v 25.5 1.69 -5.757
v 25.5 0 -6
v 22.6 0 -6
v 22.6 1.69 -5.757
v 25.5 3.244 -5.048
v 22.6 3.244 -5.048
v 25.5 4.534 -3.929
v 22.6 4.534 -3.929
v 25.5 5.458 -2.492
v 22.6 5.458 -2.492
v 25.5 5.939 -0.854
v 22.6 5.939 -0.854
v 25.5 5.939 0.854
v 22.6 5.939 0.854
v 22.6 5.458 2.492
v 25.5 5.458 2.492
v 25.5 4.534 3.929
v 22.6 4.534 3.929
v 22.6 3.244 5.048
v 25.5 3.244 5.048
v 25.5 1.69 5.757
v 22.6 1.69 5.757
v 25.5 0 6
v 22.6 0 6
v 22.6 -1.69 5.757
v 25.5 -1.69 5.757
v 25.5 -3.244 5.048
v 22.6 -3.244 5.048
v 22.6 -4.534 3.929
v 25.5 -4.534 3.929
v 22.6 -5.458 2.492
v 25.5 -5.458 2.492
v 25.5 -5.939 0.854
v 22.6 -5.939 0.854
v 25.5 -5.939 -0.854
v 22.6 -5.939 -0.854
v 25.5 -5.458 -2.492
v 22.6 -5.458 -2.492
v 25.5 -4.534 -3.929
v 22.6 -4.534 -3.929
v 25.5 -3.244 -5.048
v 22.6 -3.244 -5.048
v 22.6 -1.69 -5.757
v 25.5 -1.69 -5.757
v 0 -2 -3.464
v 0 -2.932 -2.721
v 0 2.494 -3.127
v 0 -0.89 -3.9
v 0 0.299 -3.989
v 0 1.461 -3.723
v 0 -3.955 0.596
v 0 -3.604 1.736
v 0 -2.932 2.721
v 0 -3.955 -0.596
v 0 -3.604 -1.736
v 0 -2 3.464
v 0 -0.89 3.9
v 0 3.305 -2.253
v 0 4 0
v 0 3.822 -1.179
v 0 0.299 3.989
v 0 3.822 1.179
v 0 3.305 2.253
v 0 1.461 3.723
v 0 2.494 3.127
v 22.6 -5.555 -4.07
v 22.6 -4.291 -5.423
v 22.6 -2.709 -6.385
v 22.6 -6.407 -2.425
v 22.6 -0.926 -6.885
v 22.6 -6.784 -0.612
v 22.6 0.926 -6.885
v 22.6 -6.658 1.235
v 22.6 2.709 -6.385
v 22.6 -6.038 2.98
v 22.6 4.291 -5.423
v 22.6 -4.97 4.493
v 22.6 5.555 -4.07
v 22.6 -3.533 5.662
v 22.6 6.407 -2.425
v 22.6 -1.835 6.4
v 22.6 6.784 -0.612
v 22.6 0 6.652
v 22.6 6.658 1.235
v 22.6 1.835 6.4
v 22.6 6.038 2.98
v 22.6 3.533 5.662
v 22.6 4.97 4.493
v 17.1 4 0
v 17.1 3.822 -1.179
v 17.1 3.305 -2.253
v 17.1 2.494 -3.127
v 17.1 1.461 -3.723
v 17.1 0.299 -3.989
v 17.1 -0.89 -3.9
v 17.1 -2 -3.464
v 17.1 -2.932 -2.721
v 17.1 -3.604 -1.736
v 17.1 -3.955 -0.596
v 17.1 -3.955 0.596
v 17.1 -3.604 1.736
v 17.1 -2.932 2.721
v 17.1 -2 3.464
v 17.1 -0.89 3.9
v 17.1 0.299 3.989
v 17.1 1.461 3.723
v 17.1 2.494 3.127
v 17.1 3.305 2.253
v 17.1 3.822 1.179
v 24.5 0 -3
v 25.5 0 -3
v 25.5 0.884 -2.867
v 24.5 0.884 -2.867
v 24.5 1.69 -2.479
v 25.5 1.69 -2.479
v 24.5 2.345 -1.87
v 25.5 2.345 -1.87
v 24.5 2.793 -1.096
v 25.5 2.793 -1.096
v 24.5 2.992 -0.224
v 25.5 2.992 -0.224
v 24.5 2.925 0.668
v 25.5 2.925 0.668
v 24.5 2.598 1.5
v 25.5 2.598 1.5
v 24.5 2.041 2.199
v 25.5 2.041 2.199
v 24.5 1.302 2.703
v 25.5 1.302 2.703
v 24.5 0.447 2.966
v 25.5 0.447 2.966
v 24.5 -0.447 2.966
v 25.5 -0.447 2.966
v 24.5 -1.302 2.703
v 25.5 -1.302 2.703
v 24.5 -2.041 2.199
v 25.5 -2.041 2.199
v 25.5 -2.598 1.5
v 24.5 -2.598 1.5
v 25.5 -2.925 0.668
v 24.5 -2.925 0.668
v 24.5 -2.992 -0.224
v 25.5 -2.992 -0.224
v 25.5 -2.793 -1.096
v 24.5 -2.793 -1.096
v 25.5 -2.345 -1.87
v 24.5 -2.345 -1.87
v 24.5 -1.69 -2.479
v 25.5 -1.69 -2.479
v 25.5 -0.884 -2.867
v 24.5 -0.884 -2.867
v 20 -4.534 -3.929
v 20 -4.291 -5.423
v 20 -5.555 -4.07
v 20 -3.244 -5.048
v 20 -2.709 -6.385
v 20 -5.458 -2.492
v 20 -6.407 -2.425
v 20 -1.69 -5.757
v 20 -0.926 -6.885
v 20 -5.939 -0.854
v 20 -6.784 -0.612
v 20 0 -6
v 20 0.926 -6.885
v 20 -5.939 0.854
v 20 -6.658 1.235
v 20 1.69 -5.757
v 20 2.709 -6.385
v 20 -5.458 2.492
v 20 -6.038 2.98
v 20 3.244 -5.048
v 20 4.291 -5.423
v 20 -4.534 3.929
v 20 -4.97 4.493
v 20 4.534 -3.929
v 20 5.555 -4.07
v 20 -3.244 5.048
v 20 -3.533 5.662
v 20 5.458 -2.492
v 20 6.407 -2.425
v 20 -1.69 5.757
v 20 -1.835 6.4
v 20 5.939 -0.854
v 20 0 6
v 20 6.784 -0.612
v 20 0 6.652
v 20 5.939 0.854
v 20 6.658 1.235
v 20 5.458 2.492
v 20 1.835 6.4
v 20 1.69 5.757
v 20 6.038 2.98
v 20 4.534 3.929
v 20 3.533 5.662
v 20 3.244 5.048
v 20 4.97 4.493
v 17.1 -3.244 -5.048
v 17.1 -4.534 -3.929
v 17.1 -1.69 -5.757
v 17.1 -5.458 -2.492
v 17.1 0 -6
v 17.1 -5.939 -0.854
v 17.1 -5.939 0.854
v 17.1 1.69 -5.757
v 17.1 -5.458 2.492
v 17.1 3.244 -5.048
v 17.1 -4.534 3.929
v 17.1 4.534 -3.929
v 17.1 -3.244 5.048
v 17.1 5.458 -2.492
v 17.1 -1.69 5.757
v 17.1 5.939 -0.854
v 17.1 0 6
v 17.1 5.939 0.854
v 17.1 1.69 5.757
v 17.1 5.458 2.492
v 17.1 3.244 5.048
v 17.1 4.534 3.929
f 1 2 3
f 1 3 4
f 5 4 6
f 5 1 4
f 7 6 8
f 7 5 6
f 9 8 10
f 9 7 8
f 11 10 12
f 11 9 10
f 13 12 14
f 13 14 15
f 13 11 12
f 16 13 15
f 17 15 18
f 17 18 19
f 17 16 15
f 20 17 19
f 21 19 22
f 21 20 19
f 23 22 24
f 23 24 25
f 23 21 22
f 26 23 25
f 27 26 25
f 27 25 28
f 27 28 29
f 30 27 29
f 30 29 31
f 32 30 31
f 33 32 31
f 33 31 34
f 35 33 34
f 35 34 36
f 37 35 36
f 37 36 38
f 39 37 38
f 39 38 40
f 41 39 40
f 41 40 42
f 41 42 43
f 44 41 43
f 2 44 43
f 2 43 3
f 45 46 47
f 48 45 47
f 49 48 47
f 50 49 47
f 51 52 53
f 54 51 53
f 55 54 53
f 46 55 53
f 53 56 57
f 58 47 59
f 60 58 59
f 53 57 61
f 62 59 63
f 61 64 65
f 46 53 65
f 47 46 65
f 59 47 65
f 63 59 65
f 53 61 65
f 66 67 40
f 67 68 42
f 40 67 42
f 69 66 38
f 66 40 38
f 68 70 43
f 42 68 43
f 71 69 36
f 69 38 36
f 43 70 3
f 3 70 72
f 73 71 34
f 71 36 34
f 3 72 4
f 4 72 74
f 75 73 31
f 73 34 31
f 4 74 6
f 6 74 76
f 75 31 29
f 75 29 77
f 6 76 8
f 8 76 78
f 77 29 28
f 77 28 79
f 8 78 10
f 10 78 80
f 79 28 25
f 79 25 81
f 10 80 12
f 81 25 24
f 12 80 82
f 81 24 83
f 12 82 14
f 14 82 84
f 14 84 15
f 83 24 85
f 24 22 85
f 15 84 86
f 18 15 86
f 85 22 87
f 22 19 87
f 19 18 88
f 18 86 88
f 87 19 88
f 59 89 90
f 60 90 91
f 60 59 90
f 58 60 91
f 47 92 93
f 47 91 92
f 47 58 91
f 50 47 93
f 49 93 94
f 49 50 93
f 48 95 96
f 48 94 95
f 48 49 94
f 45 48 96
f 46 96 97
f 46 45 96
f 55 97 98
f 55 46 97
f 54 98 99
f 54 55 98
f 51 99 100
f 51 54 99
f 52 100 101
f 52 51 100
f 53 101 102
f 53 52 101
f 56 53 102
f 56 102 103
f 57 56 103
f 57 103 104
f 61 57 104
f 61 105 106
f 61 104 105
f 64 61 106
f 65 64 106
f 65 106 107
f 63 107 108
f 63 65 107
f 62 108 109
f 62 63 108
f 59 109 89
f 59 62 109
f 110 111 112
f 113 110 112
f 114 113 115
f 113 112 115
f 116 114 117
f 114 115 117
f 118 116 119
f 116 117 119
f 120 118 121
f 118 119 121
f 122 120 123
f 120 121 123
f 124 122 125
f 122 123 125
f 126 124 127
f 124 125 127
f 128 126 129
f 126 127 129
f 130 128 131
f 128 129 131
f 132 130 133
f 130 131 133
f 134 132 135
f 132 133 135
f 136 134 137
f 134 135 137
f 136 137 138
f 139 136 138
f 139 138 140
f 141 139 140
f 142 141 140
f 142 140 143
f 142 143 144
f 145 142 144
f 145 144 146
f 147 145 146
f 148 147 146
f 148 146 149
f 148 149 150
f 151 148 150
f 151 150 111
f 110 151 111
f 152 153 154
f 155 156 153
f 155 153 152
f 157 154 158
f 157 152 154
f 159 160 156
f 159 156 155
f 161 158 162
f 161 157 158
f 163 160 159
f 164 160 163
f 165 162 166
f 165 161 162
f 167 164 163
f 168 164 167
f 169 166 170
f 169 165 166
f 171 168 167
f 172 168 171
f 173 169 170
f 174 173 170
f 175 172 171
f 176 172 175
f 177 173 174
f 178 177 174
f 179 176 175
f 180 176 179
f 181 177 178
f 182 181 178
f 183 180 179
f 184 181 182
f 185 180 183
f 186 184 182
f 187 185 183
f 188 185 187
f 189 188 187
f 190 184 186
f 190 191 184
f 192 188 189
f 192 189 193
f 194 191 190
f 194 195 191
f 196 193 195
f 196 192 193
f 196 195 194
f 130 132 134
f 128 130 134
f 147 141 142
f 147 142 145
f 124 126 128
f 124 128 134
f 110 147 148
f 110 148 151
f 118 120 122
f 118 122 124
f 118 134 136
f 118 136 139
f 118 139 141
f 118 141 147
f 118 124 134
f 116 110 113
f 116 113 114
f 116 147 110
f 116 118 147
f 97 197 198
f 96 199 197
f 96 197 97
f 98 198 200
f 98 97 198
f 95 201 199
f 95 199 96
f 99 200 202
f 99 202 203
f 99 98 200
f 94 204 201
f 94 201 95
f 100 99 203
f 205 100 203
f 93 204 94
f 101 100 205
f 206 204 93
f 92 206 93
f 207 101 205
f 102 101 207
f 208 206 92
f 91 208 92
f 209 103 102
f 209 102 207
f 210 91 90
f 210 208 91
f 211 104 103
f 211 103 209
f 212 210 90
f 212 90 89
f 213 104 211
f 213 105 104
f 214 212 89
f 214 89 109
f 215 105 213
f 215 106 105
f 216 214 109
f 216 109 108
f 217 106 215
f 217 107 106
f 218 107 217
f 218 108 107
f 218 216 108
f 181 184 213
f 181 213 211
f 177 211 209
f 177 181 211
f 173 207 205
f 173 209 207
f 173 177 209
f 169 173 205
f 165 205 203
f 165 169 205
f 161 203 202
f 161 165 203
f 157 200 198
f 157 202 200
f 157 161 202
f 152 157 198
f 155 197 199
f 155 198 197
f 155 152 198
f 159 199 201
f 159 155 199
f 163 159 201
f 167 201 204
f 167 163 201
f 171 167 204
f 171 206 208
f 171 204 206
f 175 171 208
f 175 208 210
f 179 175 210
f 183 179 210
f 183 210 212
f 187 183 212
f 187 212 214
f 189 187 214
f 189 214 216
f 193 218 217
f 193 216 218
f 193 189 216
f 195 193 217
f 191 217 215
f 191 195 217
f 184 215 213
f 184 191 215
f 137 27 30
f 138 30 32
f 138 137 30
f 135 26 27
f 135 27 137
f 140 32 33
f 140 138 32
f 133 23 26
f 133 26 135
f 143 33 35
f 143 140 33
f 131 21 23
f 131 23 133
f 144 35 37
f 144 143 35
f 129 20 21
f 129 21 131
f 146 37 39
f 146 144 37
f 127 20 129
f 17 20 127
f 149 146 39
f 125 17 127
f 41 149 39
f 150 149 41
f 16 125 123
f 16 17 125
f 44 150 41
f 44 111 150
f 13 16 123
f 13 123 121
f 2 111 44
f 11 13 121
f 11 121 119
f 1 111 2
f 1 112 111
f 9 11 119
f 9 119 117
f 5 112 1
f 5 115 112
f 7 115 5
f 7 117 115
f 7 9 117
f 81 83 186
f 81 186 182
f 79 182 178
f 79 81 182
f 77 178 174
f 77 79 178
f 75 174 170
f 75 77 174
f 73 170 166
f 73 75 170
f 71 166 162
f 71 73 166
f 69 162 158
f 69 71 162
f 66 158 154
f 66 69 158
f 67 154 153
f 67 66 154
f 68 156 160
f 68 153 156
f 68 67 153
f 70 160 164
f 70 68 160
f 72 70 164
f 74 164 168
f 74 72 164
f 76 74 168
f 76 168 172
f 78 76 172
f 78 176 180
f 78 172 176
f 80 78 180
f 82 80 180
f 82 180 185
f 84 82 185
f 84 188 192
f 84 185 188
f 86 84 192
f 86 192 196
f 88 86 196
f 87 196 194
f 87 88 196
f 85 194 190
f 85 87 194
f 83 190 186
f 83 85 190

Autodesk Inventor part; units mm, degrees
ref_plane "YZ Plane" through (0, 0, 0) normal (1, 0, 0) x (0, 1, 0)
ref_plane "XZ Plane" through (0, 0, 0) normal (0, 1, 0) x (-1, 0, 0)
ref_plane "XY Plane" through (0, 0, 0) normal (0, 0, 1) x (1, 0, 0)
sketch "スケッチ1" plane through (0, 0, 0) normal (1, 0, 0) x (0, 1, 0)
  circle A0 centre (0, 0) radius 4
  dimension "d0" = 8
extrude "押し出し1" add sketch "スケッチ1" along normal blind 25.5
sketch "スケッチ2" plane through (25.5, 0, 0) normal (1, 0, 0) x (0, 0, -1)
  circle A0 centre (0, 0) radius 6
  circle A1 centre (0, 0) radius 4
  dimension "d3" = 12
extrude "押し出し2" add sketch "スケッチ2" against normal blind 2.9
sketch "スケッチ3" plane through (22.6, 0, 0) normal (-1, 0, 0) x (0, 0, 1)
  circle A0 centre (0, 0) radius 3.6421
  circle A1 centre (-0.1483, 0) radius 6.8
  dimension "d6" = 13.6
extrude "押し出し3" add sketch "スケッチ3" along normal blind 2.6
sketch "スケッチ4" plane through (20, 0, -0.1483) normal (-1, 0, 0) x (0, 0, 1)
  circle A0 centre (0.1483, 0) radius 4
  circle A1 centre (0.1483, 0) radius 6
extrude "押し出し4" add sketch "スケッチ4" along normal blind 2.9
sketch "スケッチ5" plane through (25.5, 0, 0) normal (1, 0, 0) x (0, 0, -1)
  circle A0 centre (0, 0) radius 3
  dimension "d11" = 6
extrude "押し出し5" cut sketch "スケッチ5" against normal blind 1
properties part number "encoderaxis"
